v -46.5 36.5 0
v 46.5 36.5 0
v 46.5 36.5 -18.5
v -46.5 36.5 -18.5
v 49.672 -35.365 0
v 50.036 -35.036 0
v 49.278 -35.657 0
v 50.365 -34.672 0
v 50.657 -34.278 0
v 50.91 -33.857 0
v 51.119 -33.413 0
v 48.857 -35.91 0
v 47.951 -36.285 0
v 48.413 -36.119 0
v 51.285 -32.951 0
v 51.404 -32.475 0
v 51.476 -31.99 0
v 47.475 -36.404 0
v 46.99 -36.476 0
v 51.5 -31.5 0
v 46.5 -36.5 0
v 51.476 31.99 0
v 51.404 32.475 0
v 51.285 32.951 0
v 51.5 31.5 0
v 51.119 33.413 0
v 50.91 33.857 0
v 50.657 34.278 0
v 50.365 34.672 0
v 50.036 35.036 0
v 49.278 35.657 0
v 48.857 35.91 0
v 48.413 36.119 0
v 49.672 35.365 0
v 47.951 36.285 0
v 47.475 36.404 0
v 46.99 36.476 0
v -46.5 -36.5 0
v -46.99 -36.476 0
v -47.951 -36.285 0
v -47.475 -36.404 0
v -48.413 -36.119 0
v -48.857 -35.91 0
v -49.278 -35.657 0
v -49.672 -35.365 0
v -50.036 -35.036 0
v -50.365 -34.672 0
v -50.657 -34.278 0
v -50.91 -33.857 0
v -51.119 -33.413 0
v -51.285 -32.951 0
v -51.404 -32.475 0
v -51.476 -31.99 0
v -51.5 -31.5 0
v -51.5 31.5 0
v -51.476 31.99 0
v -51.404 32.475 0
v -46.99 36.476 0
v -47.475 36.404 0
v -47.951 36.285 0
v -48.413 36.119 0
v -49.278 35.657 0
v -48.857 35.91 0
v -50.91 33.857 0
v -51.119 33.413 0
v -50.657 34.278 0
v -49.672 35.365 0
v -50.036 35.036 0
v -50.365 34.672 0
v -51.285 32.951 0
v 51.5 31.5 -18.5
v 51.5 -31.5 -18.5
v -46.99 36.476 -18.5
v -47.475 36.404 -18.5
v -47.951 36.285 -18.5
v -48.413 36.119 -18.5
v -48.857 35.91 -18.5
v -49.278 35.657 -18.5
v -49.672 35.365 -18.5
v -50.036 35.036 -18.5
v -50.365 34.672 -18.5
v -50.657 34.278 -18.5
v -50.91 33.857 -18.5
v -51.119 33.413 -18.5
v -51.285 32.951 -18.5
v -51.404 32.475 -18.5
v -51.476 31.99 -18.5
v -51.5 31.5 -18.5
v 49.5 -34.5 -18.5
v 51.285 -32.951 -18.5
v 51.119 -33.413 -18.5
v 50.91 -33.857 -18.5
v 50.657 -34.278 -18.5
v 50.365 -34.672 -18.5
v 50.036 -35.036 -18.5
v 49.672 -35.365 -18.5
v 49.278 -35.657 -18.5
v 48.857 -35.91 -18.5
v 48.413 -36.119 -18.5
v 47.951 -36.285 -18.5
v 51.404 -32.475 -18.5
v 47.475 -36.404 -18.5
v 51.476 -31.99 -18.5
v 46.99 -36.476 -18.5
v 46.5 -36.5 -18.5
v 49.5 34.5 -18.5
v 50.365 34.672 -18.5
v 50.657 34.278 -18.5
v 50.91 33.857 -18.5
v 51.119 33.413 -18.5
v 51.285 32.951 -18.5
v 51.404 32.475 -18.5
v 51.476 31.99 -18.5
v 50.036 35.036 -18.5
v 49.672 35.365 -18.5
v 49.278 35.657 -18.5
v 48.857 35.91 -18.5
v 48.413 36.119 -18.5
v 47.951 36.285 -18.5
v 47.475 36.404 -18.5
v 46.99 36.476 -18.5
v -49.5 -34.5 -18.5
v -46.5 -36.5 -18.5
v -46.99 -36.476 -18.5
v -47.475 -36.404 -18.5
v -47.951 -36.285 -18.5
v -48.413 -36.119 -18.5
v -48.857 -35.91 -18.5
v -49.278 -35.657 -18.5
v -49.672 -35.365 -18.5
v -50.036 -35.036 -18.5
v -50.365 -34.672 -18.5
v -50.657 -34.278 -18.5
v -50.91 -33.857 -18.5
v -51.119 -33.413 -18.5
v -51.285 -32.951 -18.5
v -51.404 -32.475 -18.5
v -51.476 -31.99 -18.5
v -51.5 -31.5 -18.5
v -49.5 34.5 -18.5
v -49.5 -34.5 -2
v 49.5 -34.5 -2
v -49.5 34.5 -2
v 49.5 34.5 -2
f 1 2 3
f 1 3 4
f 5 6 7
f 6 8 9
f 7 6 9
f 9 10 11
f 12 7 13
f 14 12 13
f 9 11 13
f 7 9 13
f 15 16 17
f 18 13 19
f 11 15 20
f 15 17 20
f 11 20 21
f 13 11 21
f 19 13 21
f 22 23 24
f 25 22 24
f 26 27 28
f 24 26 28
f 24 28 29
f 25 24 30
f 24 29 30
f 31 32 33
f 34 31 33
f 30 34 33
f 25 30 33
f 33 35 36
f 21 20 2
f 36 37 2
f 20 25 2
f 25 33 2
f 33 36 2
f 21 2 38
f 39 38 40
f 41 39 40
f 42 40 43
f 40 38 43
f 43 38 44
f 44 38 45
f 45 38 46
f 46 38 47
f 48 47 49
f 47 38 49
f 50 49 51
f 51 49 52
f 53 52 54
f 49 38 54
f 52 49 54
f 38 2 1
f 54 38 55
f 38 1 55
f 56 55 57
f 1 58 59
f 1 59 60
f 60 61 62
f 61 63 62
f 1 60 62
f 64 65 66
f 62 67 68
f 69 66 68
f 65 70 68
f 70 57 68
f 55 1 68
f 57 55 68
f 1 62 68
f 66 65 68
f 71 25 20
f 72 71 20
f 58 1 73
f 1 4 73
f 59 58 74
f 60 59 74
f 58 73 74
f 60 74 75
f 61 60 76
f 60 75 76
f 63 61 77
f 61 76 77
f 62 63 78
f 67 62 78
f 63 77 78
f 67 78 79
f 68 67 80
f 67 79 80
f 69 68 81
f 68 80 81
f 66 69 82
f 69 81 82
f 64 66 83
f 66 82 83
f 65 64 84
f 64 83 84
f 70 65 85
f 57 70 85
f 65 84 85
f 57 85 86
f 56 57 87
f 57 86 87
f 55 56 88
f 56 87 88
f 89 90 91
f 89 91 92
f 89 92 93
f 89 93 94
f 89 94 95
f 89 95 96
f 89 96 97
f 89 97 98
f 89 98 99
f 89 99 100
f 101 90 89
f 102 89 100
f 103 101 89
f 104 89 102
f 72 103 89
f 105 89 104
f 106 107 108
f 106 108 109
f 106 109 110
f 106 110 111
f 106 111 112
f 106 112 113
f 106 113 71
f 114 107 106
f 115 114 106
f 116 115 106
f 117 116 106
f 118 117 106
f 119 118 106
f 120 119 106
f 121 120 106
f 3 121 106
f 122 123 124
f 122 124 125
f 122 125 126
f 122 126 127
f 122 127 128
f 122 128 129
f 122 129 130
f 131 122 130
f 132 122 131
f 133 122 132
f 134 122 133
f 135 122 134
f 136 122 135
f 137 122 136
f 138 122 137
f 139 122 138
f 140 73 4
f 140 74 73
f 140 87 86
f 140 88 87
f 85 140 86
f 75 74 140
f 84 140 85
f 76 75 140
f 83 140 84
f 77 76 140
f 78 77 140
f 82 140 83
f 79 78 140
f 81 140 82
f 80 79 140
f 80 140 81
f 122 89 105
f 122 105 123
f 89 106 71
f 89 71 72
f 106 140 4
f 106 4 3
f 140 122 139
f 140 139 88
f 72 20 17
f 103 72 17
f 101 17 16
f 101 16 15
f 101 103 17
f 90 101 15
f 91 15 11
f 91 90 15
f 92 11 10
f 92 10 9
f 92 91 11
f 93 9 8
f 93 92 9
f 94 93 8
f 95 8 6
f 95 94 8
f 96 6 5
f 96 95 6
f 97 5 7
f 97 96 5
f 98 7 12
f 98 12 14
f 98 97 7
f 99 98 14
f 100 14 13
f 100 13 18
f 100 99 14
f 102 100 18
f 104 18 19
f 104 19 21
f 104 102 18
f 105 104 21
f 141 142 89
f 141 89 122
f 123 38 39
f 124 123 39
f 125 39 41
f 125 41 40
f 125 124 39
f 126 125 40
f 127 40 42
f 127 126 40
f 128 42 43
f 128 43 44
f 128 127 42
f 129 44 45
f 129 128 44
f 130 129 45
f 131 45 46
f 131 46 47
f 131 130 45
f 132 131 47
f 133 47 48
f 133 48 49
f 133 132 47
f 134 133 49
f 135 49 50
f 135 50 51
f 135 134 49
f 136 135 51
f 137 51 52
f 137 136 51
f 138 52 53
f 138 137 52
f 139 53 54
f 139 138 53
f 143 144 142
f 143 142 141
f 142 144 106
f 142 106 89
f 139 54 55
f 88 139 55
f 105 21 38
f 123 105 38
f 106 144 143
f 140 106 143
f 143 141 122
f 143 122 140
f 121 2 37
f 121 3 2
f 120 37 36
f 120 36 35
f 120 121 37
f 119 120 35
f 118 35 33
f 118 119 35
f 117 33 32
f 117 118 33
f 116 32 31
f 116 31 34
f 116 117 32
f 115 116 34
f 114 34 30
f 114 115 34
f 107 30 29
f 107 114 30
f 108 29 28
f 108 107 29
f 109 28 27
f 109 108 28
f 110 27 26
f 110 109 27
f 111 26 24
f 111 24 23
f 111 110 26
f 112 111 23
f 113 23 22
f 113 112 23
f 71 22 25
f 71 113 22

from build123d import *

# Parameters (mm, degrees)
DODANIE_WYCI_GNI_CIE6_DEPTH = 18.5
SKORUPA2_T                  = -2
FILLET1_R                   = 5


with BuildPart() as part:
    # Szkic5 → Dodanie-wyciągnięcie6 (new body)
    with BuildSketch(Plane.XY):
        Polygon((38, 36.5), (51.5, 36.5), (51.5, -36.5), (-51.5, -36.5), (-51.5, 36.5), (-5.5, 36.5), align=None)
    extrude(amount=-DODANIE_WYCI_GNI_CIE6_DEPTH)

    # Skorupa2
    skorupa2_openings = [part.faces().sort_by_distance(p)[0] for p in [
        (0, 0, -18.5),
    ]]
    offset(amount=SKORUPA2_T, openings=skorupa2_openings, kind=Kind.INTERSECTION)

    # Fillet1
    fillet1_edges = [part.edges().sort_by_distance(p)[0] for p in [
        (51.5, -36.5, -9.25),
        (-51.5, -36.5, -9.25),
        (-51.5, 36.5, -9.25),
        (51.5, 36.5, -9.25),
    ]]
    fillet(fillet1_edges, radius=FILLET1_R)


solid = part.part
